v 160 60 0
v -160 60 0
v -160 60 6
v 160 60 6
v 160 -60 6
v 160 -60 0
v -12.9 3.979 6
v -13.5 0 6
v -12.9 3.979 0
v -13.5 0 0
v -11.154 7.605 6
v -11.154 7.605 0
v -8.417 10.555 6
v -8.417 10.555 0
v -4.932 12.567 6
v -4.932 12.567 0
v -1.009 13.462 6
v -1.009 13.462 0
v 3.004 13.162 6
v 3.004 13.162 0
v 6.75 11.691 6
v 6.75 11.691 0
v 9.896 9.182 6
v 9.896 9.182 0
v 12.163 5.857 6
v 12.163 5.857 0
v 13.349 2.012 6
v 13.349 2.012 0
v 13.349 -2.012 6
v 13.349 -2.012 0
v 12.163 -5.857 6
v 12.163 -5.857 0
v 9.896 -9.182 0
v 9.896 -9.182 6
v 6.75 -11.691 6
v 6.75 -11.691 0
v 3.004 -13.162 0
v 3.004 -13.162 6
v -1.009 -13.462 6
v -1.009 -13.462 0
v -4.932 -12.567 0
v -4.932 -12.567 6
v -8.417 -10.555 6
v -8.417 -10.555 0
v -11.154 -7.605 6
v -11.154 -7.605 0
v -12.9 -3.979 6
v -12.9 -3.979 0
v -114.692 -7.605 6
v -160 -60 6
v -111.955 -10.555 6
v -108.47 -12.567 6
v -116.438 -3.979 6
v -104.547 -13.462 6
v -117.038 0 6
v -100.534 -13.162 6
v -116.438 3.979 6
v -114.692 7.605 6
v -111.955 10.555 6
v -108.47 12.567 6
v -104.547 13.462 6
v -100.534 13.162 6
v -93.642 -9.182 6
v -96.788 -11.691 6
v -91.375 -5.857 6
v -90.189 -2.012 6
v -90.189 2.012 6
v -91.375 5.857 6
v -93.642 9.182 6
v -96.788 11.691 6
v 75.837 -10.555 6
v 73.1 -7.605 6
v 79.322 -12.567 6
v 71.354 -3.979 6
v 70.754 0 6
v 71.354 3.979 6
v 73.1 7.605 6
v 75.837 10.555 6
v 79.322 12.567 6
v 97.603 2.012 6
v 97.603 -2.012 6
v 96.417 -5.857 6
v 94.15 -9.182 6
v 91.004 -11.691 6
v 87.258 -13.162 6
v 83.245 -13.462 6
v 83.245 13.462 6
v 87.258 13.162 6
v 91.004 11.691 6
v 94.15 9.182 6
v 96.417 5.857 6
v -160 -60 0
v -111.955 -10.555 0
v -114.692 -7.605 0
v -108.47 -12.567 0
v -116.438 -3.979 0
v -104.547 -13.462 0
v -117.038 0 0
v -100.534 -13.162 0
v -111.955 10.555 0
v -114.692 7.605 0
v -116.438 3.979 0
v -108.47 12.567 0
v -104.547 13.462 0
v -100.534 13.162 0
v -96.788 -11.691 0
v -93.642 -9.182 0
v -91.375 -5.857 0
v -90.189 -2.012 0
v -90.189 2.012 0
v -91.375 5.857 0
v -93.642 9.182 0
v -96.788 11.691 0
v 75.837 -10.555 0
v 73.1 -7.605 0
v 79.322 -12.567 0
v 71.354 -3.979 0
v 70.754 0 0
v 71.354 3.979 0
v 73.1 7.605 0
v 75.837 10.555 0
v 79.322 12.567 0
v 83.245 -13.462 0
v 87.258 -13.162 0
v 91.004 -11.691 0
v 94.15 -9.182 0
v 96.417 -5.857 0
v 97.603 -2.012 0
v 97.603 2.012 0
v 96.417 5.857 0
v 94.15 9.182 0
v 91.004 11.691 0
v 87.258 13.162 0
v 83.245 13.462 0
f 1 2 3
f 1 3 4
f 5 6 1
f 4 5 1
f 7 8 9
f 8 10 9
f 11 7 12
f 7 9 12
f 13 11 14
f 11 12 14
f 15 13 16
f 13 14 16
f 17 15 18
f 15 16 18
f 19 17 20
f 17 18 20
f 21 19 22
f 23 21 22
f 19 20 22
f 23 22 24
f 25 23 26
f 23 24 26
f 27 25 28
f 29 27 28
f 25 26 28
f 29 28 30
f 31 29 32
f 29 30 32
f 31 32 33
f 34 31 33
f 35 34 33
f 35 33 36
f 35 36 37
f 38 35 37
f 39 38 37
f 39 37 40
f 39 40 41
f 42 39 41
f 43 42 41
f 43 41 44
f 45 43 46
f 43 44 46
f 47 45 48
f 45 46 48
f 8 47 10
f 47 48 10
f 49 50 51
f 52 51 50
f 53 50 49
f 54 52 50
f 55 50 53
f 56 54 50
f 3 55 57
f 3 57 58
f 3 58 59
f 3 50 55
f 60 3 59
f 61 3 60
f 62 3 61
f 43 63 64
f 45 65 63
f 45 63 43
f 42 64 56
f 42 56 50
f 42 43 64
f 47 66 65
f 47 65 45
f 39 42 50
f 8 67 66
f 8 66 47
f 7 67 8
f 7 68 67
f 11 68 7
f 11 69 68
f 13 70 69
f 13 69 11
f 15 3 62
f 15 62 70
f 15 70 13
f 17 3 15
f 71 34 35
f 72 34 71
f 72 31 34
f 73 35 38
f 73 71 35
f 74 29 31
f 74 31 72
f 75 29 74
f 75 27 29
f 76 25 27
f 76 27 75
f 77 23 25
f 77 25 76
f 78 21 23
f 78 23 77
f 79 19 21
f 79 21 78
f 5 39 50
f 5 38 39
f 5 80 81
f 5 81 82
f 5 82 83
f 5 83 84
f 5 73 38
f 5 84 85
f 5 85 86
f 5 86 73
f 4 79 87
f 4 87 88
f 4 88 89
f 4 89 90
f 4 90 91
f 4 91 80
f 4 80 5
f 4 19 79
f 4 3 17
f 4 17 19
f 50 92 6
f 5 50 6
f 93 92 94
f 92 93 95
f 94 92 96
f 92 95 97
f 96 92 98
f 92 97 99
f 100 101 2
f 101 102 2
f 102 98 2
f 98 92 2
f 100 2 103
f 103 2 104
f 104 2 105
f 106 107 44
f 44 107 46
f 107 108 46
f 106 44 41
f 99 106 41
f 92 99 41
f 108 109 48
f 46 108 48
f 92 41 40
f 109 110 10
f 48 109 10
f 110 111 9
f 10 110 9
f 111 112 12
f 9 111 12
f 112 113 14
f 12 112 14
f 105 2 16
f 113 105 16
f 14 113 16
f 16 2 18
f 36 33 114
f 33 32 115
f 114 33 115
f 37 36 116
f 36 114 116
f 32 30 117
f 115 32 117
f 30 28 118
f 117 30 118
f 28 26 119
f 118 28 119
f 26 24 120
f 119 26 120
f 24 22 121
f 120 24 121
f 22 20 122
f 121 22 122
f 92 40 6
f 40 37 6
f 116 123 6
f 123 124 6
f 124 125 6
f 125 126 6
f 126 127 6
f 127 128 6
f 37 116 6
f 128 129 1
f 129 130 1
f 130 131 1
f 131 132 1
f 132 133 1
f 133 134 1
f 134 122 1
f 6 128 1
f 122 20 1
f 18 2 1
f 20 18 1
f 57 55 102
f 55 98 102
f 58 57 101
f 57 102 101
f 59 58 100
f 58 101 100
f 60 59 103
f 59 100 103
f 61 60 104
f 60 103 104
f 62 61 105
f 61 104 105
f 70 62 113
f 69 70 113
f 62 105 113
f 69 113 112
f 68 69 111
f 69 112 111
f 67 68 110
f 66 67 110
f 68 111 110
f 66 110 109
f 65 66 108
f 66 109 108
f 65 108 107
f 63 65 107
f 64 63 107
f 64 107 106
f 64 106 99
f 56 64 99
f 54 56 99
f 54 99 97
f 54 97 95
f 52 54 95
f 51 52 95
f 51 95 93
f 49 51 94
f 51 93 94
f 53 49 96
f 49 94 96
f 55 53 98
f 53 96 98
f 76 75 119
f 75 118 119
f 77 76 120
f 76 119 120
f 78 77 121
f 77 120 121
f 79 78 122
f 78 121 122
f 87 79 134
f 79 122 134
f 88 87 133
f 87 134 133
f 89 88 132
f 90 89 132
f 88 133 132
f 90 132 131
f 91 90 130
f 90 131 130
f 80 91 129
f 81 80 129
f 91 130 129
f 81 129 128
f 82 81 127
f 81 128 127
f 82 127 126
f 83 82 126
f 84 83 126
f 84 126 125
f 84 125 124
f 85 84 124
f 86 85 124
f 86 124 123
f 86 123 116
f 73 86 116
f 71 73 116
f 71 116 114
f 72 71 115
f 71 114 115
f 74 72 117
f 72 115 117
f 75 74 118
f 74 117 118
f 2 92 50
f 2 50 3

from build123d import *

# Parameters (mm, degrees)
ESQUISSE1_W               = 320
ESQUISSE1_H               = 120
BOSS_EXTRU_1_DEPTH        = 6
M25_CLEARANCE_HOLE1_D     = 27
M25_CLEARANCE_HOLE1_DEPTH = 6
M25_CLEARANCE_HOLE1_TIP   = 8.111618357


with BuildPart() as part:
    # Esquisse1 → Boss.-Extru.1 (new body)
    with BuildSketch(Plane.XY):
        Rectangle(ESQUISSE1_W, ESQUISSE1_H)
    extrude(amount=BOSS_EXTRU_1_DEPTH)

    # M25 Clearance Hole1
    with Locations(Plane.XY.offset(6)):
        with Locations((-103.53808412, 0), (0, 0), (84.253962724, 0)):
            Hole(M25_CLEARANCE_HOLE1_D / 2, depth=M25_CLEARANCE_HOLE1_DEPTH)
            with Locations((0, 0, -(M25_CLEARANCE_HOLE1_DEPTH + M25_CLEARANCE_HOLE1_TIP / 2))):  # 118° drill point
                Cone(0, M25_CLEARANCE_HOLE1_D / 2, M25_CLEARANCE_HOLE1_TIP, mode=Mode.SUBTRACT)


solid = part.part
